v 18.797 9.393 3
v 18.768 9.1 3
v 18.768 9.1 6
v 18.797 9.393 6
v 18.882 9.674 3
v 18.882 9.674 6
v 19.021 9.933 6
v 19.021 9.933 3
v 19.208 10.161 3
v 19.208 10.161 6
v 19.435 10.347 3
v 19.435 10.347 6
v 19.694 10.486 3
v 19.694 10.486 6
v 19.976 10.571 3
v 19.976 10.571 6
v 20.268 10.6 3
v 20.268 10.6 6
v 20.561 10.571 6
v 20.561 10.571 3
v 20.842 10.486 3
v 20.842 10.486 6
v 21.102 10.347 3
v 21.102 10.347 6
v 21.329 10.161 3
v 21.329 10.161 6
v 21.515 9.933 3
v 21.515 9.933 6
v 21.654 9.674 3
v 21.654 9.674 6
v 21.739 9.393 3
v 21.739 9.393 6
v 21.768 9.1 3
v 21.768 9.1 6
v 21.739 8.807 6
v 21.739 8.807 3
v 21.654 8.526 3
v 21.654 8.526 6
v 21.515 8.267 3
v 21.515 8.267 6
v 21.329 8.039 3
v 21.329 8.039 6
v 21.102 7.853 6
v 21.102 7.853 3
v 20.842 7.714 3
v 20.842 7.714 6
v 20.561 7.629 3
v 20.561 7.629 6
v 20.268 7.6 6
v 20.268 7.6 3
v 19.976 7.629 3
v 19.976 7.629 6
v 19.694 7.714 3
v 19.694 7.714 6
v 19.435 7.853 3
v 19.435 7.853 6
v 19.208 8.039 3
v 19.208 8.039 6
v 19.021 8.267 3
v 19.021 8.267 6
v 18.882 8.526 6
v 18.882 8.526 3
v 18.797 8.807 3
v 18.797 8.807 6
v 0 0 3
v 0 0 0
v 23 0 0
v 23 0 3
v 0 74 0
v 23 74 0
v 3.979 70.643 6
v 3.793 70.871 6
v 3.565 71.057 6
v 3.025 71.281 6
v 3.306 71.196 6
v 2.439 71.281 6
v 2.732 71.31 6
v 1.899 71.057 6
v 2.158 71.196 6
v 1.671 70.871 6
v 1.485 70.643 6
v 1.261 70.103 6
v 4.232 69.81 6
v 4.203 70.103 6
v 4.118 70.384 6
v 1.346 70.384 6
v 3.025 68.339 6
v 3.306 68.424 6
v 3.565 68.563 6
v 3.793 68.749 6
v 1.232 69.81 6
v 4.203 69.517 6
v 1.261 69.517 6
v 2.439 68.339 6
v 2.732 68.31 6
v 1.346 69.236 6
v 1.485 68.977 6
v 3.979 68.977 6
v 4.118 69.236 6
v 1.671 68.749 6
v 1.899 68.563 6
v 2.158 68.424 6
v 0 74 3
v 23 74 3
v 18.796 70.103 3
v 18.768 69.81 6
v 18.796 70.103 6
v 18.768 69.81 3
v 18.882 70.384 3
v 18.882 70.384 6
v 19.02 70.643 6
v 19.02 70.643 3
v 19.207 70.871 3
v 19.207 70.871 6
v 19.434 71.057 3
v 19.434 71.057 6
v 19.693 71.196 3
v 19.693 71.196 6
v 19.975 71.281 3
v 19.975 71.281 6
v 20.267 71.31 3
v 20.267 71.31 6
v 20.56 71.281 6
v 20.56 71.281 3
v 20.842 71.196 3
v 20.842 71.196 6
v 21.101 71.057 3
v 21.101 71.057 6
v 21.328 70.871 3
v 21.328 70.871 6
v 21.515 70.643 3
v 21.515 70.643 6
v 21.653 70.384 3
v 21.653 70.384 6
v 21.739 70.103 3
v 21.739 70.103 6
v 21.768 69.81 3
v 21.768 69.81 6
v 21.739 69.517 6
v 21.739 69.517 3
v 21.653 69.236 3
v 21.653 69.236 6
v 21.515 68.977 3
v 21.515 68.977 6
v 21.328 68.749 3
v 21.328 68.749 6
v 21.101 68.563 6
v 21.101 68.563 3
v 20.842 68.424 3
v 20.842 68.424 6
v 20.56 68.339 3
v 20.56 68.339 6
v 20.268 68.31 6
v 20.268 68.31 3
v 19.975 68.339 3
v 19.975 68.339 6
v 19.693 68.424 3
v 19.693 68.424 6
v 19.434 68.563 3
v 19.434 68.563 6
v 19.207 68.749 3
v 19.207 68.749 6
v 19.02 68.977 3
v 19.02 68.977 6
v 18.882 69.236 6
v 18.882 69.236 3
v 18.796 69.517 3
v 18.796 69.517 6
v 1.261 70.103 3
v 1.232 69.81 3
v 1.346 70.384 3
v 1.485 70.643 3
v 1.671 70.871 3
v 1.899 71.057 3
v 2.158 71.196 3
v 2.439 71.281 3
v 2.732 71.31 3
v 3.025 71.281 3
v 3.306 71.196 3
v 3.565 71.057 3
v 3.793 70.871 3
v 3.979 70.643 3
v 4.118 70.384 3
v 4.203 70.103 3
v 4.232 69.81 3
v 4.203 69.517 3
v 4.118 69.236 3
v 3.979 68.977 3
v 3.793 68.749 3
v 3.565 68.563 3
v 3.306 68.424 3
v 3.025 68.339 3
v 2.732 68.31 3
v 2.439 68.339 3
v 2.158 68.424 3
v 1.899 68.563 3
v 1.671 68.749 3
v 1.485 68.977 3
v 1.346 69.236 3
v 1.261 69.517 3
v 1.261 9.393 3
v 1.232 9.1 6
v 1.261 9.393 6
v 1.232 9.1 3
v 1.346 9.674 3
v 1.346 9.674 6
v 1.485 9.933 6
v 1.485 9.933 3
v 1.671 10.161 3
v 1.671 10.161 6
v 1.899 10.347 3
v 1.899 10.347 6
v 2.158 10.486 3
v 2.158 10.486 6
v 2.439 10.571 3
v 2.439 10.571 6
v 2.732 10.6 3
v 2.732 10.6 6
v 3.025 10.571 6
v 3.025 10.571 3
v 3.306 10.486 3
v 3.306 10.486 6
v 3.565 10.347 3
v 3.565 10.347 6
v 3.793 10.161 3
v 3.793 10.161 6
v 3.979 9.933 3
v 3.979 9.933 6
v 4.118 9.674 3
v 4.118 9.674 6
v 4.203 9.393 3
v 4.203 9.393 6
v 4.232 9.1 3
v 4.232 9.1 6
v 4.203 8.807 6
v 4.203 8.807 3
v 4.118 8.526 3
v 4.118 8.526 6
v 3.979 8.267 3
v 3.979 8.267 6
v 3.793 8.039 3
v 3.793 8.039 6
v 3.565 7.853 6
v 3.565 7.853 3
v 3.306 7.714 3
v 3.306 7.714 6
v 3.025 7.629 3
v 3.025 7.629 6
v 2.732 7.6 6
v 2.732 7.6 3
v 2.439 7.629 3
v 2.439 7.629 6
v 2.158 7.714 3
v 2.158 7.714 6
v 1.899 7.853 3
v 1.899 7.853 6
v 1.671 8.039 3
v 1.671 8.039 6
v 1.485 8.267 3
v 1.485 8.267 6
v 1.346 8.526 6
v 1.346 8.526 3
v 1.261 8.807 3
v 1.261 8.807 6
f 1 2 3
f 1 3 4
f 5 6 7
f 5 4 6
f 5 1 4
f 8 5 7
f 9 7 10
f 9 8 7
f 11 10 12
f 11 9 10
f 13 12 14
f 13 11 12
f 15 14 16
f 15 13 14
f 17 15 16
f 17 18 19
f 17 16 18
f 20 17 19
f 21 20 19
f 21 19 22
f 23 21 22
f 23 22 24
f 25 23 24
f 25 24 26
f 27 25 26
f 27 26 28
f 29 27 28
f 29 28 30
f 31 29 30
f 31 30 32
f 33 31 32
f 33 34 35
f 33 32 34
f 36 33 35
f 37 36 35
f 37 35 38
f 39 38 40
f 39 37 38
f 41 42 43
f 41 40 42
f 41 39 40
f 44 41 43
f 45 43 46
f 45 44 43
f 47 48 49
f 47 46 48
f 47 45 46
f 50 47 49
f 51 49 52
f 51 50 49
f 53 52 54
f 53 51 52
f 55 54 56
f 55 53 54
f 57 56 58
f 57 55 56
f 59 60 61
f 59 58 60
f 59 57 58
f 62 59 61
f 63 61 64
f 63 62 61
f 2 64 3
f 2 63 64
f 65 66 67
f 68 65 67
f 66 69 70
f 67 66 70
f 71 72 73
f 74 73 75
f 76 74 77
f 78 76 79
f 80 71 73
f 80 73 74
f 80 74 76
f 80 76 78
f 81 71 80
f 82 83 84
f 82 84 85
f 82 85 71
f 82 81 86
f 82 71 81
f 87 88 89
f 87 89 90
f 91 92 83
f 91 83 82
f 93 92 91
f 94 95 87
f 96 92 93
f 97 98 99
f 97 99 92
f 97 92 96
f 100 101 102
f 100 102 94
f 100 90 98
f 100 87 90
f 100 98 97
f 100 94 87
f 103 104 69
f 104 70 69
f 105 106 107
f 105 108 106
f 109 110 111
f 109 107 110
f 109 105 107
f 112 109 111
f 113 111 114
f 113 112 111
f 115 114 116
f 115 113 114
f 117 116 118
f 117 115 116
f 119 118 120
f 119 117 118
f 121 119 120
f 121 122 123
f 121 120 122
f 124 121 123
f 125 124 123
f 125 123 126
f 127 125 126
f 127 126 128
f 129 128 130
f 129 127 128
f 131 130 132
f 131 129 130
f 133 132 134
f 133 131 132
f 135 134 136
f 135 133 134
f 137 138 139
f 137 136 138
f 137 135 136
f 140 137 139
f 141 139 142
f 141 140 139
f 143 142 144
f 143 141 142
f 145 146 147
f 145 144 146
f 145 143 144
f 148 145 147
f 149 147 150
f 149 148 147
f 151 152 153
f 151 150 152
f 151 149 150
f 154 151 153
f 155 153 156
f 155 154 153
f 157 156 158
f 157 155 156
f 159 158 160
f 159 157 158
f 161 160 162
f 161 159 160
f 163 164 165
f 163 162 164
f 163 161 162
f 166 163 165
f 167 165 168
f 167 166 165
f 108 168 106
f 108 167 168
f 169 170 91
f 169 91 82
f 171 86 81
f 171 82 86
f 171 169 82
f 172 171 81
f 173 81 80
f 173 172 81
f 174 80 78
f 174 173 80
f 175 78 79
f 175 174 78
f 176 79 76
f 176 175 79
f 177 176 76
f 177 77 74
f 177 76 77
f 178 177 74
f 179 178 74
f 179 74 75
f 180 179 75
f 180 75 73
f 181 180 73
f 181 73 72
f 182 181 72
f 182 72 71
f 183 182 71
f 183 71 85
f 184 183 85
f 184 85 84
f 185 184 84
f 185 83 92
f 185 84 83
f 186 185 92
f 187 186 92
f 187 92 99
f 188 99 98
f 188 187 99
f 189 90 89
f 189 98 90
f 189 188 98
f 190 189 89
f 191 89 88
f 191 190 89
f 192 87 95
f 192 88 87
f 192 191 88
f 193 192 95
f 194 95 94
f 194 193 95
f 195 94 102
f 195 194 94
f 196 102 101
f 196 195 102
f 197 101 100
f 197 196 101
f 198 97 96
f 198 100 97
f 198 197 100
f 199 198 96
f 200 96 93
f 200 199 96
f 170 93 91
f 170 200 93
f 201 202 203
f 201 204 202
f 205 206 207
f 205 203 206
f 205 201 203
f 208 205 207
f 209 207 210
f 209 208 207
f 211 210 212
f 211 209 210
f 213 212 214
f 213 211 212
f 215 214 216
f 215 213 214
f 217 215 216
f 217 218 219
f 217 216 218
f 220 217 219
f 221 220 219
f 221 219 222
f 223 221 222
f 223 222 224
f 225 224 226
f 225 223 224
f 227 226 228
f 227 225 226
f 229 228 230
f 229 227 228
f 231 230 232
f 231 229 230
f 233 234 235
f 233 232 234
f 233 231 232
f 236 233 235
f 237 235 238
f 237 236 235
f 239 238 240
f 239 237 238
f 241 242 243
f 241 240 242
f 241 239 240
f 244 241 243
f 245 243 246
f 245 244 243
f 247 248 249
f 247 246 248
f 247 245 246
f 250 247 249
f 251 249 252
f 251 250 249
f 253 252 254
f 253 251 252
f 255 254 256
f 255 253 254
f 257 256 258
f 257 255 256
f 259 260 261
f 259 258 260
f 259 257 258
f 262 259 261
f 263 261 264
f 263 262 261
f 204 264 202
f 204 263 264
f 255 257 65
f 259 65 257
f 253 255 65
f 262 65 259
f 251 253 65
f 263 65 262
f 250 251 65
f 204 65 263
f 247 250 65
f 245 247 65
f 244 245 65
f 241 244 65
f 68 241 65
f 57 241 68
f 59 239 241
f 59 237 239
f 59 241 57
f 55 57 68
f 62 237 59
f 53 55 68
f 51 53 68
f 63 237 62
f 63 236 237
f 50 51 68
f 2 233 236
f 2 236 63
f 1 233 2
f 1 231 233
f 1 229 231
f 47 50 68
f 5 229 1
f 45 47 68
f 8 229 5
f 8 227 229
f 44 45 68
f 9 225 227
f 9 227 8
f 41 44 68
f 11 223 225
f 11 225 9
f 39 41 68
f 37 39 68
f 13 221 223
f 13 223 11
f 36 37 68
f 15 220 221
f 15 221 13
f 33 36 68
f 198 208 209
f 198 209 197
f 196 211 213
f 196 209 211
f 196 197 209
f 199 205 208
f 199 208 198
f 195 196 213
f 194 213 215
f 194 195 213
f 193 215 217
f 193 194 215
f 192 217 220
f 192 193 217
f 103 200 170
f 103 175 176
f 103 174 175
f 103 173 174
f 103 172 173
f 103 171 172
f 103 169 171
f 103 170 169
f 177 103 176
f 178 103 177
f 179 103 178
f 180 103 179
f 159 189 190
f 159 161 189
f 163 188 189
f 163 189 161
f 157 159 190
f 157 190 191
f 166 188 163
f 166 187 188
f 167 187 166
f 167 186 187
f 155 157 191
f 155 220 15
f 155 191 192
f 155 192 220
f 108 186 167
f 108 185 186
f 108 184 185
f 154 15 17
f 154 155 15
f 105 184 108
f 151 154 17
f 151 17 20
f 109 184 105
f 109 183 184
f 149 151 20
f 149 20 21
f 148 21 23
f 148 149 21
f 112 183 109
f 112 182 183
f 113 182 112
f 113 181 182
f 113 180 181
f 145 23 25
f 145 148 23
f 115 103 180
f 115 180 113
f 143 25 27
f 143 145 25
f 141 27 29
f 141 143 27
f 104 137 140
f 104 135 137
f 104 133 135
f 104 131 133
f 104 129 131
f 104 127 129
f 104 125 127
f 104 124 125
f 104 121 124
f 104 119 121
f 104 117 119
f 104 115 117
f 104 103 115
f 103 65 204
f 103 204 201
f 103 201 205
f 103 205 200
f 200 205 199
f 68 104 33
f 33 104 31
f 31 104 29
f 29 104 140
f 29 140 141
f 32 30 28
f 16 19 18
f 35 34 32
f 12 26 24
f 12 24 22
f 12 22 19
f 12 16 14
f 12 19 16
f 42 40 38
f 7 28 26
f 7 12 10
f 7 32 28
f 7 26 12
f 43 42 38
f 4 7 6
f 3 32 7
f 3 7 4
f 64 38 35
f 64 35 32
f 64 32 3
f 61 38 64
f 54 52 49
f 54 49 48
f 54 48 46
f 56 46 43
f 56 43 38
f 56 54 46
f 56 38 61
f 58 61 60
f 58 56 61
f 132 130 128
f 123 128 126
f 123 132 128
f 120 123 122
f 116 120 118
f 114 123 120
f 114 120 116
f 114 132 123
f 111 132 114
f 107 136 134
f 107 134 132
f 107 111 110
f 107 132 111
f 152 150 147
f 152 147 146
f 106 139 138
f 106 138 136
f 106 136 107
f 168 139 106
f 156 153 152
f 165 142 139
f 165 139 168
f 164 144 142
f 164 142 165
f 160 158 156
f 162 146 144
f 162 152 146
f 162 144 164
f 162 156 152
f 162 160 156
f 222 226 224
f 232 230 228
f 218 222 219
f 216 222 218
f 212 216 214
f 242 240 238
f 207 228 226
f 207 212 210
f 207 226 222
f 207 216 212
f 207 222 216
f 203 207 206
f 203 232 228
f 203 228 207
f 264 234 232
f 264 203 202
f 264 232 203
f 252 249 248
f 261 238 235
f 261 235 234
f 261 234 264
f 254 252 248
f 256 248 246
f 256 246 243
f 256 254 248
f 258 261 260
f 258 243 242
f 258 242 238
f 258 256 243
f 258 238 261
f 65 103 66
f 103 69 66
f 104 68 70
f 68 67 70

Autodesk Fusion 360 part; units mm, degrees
sketch "Sketch1" plane through (0, 0, 0) normal (0, 0, 1) x (1, 0, 0)
  line L0 (0, 0) -> (23, 0)
  line L1 (23, 0) -> (23, 74)
  line L2 (23, 74) -> (0, 74)
  line L3 (0, 74) -> (0, 0)
  dimension "d1" = 23
  dimension "d2" = 74
extrude "Extrude1" add sketch "Sketch1" along normal blind 3
sketch "Sketch2" plane through (0, 0, 3) normal (0, 0, 1) x (-1, 0, 0)
  line L0 (0, -74) -> (0, 0)
  line L1 (0, 0) -> (-23, 0)
  line L2 (-23, 0) -> (-23, -74)
  line L3 (-23, -74) -> (0, -74)
  circle A0 centre (-2.732, -9.1) radius 1.5
  circle A1 centre (-20.2682, -9.1) radius 1.5
  circle A2 centre (-2.732, -69.81) radius 1.5
  circle A3 centre (-20.2675, -69.81) radius 1.5
  dimension "d5" = 3
  dimension "d6" = 3
  dimension "d7" = 3
  dimension "d8" = 3
extrude "Extrude2" add sketch "Sketch2" along normal blind 3 contours A0 | A1 | A2 | A3
